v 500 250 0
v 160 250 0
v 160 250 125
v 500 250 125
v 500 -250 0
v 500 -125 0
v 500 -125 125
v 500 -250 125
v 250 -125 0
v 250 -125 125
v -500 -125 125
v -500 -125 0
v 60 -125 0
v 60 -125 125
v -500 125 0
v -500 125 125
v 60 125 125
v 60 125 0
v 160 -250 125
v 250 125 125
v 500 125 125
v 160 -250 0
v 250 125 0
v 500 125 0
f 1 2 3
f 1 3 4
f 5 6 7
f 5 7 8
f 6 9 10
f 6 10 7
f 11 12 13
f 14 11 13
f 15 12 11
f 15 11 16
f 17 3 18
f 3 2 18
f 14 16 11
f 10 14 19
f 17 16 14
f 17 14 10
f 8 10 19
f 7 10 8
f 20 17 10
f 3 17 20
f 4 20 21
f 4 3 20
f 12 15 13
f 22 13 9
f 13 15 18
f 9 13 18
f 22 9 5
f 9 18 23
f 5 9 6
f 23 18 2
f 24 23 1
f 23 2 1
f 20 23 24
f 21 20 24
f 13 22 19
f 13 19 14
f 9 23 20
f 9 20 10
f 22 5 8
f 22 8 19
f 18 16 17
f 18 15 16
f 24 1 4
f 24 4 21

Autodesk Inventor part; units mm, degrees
ref_plane "YZ Plane" through (0, 0, 0) normal (1, 0, 0) x (0, 1, 0)
ref_plane "XZ Plane" through (0, 0, 0) normal (0, 1, 0) x (-1, 0, 0)
ref_plane "XY Plane" through (0, 0, 0) normal (0, 0, 1) x (1, 0, 0)
sketch "Sketch2" plane through (0, 0, 0) normal (0, 0, 1) x (1, 0, 0)
  line L0 (500, -250) -> (160, -250)
  line L1 (-500, -125) -> (-500, 125)
  line L2 (160, 250) -> (500, 250)
  line L3 (500, -250) -> (-500, 250) construction
  line L4 (-500, -250) -> (500, 250) construction
  line L5 (250, 125) -> (250, -125)
  line L6 (500, 250) -> (500, 125)
  line L7 (500, -125) -> (500, -250)
  line L8 (-500, 125) -> (60, 125)
  line L9 (250, 125) -> (500, 125)
  line L10 (-500, -125) -> (60, -125)
  line L11 (250, -125) -> (500, -125)
  line L12 (160, 250) -> (60, 125)
  line L13 (160, -250) -> (60, -125)
  point P0 (0, 0)
  dimension "d0" = 1000
  dimension "d1" = 500
  dimension "d2" = 1000
extrude "Extrusion1" add sketch "Sketch2" along normal blind 125
properties part number "wrench"
